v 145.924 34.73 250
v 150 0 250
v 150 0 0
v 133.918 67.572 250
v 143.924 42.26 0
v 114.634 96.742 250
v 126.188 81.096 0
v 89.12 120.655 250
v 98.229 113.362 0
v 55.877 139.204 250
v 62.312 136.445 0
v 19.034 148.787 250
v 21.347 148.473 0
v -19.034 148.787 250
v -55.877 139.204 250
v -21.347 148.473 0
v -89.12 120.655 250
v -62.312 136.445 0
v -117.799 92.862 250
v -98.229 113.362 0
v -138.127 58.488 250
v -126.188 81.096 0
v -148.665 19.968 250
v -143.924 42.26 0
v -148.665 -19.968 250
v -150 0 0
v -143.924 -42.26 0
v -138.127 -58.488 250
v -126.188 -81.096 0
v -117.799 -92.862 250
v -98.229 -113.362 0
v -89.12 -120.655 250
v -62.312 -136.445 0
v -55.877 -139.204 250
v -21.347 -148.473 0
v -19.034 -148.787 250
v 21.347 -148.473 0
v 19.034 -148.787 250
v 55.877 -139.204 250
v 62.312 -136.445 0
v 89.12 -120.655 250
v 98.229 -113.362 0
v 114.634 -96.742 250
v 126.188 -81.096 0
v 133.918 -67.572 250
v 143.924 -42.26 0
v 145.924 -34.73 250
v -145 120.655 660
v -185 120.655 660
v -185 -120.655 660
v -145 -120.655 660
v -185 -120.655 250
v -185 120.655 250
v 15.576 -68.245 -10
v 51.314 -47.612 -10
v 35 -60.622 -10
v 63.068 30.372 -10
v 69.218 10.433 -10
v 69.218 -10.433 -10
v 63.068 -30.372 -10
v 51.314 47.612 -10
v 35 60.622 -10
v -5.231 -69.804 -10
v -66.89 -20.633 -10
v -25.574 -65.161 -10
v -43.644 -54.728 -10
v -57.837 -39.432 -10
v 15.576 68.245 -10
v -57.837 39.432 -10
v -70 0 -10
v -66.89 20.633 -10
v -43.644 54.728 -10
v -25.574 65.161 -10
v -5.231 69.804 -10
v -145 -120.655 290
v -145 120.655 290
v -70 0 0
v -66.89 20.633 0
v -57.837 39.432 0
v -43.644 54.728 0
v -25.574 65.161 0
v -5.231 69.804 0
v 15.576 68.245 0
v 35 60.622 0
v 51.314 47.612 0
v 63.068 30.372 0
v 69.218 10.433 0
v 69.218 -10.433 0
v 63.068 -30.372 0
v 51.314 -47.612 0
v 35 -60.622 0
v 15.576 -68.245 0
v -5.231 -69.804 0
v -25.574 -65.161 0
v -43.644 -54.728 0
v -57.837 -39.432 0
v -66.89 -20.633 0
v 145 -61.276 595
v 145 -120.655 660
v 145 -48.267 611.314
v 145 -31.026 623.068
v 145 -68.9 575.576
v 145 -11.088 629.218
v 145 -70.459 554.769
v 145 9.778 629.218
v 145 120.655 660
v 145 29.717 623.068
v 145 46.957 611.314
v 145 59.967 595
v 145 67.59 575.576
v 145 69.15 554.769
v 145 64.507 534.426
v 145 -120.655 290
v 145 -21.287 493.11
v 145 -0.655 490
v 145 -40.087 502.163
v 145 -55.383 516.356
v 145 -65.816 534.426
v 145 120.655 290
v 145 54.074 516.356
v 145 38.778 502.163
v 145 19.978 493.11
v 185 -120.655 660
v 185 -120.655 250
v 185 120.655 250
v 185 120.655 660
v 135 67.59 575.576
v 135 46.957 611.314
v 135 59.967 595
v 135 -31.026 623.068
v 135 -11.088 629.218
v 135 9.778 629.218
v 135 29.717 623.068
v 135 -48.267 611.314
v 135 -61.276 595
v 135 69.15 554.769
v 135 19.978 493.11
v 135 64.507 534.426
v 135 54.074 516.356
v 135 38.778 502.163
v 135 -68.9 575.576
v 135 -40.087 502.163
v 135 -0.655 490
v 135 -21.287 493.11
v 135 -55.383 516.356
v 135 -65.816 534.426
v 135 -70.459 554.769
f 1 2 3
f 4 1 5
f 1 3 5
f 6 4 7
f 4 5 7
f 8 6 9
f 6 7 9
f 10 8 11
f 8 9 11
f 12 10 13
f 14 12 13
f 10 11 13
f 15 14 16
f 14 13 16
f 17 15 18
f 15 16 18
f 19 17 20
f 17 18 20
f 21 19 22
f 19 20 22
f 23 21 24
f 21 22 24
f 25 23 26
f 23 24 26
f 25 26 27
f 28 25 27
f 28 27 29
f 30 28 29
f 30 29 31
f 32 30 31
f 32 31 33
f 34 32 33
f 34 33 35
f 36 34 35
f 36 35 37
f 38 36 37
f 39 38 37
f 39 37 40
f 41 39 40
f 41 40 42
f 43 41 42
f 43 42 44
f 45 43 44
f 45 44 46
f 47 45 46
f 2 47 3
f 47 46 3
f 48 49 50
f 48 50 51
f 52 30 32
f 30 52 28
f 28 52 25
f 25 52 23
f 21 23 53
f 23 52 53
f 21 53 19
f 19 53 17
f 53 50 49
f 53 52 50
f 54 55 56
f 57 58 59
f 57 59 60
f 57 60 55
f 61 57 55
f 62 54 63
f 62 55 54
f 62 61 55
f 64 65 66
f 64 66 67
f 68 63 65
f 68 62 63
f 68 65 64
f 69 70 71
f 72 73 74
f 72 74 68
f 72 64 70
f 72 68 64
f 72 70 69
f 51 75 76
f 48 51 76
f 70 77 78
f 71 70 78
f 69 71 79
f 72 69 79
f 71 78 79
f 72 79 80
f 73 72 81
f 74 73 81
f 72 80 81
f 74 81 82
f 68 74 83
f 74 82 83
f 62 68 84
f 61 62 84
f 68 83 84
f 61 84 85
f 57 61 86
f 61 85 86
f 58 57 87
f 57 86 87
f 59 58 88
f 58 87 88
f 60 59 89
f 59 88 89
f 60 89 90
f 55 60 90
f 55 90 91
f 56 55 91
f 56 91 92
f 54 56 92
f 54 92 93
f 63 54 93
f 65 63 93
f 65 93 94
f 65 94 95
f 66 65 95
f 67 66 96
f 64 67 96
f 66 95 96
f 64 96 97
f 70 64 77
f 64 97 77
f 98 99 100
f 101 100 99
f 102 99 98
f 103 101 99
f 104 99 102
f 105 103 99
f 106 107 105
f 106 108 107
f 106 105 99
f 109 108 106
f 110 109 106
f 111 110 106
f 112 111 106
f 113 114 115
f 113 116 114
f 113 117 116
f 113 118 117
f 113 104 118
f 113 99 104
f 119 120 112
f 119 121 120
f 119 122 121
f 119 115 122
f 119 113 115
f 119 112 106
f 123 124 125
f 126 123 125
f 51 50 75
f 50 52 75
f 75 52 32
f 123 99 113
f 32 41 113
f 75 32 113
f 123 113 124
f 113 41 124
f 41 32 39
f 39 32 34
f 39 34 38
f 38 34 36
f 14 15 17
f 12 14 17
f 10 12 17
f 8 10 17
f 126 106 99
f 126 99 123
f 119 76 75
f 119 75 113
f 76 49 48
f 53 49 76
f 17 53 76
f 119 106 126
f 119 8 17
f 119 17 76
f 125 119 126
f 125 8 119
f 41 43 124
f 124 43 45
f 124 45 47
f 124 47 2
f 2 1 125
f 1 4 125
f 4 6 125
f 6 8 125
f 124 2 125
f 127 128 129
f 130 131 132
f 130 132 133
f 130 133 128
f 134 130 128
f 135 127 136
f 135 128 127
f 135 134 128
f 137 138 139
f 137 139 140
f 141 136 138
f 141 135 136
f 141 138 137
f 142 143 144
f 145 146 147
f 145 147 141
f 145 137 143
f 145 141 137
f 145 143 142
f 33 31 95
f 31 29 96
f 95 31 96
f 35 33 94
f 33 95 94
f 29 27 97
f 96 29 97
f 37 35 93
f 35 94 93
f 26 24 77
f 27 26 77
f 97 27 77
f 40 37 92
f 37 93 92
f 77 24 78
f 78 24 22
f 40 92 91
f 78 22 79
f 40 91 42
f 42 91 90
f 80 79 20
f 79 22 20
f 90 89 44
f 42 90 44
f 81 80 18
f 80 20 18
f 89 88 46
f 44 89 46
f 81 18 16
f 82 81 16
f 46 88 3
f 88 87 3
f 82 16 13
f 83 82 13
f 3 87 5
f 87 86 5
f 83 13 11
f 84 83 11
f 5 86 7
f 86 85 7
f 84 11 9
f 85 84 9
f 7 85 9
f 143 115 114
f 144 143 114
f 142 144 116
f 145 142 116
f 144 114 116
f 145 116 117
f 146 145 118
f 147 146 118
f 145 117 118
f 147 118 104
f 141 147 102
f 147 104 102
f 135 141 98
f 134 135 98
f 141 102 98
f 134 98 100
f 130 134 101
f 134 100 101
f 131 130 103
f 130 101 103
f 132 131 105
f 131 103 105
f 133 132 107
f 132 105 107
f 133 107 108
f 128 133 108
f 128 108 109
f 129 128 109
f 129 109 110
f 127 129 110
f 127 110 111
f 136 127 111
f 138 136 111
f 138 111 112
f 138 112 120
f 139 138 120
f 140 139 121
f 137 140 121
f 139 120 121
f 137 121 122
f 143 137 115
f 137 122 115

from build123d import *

# Parameters (mm, degrees)
ESQUISSE1_R        = 150
BOSS_EXTRU_1_DEPTH = 250
ESQUISSE2_R        = 70
BOSS_EXTRU_2_DEPTH = 10
ESQUISSE3_W        = 370
ESQUISSE3_H        = 241.309251742
BOSS_EXTRU_3_DEPTH = 40
ESQUISSE4_W        = 40
ESQUISSE4_H        = 241.309251742
BOSS_EXTRU_4_DEPTH = 370
ESQUISSE5_R        = 70
BOSS_EXTRU_5_DEPTH = 10


with BuildPart() as part:
    # Esquisse1 → Boss.-Extru.1 (new body)
    with BuildSketch(Plane.XY):
        Circle(ESQUISSE1_R)
    extrude(amount=BOSS_EXTRU_1_DEPTH)

    # Esquisse2 → Boss.-Extru.2 (add)
    with BuildSketch(Plane(origin=(0, 0, 0), x_dir=(-1, 0, 0), z_dir=(0, 0, -1))):
        Circle(ESQUISSE2_R)
    extrude(amount=BOSS_EXTRU_2_DEPTH)

    # Esquisse3 → Boss.-Extru.3 (add)
    with BuildSketch(Plane.XY.offset(250)):
        Rectangle(ESQUISSE3_W, ESQUISSE3_H)
    extrude(amount=BOSS_EXTRU_3_DEPTH)

    # Esquisse4 → Boss.-Extru.4 (add)
    with BuildSketch(Plane.XY.offset(290)):
        with Locations((-165, 0)):
            Rectangle(ESQUISSE4_W, ESQUISSE4_H)
        with Locations((165, 0)):
            Rectangle(ESQUISSE4_W, ESQUISSE4_H)
    extrude(amount=BOSS_EXTRU_4_DEPTH)

    # Esquisse5 → Boss.-Extru.5 (add)
    with BuildSketch(Plane.ZY.offset(-145)):
        with Locations(Location((560, -0.654625871, 0), (0, 0, 180))):
            Circle(ESQUISSE5_R)
    extrude(amount=BOSS_EXTRU_5_DEPTH)


solid = part.part
